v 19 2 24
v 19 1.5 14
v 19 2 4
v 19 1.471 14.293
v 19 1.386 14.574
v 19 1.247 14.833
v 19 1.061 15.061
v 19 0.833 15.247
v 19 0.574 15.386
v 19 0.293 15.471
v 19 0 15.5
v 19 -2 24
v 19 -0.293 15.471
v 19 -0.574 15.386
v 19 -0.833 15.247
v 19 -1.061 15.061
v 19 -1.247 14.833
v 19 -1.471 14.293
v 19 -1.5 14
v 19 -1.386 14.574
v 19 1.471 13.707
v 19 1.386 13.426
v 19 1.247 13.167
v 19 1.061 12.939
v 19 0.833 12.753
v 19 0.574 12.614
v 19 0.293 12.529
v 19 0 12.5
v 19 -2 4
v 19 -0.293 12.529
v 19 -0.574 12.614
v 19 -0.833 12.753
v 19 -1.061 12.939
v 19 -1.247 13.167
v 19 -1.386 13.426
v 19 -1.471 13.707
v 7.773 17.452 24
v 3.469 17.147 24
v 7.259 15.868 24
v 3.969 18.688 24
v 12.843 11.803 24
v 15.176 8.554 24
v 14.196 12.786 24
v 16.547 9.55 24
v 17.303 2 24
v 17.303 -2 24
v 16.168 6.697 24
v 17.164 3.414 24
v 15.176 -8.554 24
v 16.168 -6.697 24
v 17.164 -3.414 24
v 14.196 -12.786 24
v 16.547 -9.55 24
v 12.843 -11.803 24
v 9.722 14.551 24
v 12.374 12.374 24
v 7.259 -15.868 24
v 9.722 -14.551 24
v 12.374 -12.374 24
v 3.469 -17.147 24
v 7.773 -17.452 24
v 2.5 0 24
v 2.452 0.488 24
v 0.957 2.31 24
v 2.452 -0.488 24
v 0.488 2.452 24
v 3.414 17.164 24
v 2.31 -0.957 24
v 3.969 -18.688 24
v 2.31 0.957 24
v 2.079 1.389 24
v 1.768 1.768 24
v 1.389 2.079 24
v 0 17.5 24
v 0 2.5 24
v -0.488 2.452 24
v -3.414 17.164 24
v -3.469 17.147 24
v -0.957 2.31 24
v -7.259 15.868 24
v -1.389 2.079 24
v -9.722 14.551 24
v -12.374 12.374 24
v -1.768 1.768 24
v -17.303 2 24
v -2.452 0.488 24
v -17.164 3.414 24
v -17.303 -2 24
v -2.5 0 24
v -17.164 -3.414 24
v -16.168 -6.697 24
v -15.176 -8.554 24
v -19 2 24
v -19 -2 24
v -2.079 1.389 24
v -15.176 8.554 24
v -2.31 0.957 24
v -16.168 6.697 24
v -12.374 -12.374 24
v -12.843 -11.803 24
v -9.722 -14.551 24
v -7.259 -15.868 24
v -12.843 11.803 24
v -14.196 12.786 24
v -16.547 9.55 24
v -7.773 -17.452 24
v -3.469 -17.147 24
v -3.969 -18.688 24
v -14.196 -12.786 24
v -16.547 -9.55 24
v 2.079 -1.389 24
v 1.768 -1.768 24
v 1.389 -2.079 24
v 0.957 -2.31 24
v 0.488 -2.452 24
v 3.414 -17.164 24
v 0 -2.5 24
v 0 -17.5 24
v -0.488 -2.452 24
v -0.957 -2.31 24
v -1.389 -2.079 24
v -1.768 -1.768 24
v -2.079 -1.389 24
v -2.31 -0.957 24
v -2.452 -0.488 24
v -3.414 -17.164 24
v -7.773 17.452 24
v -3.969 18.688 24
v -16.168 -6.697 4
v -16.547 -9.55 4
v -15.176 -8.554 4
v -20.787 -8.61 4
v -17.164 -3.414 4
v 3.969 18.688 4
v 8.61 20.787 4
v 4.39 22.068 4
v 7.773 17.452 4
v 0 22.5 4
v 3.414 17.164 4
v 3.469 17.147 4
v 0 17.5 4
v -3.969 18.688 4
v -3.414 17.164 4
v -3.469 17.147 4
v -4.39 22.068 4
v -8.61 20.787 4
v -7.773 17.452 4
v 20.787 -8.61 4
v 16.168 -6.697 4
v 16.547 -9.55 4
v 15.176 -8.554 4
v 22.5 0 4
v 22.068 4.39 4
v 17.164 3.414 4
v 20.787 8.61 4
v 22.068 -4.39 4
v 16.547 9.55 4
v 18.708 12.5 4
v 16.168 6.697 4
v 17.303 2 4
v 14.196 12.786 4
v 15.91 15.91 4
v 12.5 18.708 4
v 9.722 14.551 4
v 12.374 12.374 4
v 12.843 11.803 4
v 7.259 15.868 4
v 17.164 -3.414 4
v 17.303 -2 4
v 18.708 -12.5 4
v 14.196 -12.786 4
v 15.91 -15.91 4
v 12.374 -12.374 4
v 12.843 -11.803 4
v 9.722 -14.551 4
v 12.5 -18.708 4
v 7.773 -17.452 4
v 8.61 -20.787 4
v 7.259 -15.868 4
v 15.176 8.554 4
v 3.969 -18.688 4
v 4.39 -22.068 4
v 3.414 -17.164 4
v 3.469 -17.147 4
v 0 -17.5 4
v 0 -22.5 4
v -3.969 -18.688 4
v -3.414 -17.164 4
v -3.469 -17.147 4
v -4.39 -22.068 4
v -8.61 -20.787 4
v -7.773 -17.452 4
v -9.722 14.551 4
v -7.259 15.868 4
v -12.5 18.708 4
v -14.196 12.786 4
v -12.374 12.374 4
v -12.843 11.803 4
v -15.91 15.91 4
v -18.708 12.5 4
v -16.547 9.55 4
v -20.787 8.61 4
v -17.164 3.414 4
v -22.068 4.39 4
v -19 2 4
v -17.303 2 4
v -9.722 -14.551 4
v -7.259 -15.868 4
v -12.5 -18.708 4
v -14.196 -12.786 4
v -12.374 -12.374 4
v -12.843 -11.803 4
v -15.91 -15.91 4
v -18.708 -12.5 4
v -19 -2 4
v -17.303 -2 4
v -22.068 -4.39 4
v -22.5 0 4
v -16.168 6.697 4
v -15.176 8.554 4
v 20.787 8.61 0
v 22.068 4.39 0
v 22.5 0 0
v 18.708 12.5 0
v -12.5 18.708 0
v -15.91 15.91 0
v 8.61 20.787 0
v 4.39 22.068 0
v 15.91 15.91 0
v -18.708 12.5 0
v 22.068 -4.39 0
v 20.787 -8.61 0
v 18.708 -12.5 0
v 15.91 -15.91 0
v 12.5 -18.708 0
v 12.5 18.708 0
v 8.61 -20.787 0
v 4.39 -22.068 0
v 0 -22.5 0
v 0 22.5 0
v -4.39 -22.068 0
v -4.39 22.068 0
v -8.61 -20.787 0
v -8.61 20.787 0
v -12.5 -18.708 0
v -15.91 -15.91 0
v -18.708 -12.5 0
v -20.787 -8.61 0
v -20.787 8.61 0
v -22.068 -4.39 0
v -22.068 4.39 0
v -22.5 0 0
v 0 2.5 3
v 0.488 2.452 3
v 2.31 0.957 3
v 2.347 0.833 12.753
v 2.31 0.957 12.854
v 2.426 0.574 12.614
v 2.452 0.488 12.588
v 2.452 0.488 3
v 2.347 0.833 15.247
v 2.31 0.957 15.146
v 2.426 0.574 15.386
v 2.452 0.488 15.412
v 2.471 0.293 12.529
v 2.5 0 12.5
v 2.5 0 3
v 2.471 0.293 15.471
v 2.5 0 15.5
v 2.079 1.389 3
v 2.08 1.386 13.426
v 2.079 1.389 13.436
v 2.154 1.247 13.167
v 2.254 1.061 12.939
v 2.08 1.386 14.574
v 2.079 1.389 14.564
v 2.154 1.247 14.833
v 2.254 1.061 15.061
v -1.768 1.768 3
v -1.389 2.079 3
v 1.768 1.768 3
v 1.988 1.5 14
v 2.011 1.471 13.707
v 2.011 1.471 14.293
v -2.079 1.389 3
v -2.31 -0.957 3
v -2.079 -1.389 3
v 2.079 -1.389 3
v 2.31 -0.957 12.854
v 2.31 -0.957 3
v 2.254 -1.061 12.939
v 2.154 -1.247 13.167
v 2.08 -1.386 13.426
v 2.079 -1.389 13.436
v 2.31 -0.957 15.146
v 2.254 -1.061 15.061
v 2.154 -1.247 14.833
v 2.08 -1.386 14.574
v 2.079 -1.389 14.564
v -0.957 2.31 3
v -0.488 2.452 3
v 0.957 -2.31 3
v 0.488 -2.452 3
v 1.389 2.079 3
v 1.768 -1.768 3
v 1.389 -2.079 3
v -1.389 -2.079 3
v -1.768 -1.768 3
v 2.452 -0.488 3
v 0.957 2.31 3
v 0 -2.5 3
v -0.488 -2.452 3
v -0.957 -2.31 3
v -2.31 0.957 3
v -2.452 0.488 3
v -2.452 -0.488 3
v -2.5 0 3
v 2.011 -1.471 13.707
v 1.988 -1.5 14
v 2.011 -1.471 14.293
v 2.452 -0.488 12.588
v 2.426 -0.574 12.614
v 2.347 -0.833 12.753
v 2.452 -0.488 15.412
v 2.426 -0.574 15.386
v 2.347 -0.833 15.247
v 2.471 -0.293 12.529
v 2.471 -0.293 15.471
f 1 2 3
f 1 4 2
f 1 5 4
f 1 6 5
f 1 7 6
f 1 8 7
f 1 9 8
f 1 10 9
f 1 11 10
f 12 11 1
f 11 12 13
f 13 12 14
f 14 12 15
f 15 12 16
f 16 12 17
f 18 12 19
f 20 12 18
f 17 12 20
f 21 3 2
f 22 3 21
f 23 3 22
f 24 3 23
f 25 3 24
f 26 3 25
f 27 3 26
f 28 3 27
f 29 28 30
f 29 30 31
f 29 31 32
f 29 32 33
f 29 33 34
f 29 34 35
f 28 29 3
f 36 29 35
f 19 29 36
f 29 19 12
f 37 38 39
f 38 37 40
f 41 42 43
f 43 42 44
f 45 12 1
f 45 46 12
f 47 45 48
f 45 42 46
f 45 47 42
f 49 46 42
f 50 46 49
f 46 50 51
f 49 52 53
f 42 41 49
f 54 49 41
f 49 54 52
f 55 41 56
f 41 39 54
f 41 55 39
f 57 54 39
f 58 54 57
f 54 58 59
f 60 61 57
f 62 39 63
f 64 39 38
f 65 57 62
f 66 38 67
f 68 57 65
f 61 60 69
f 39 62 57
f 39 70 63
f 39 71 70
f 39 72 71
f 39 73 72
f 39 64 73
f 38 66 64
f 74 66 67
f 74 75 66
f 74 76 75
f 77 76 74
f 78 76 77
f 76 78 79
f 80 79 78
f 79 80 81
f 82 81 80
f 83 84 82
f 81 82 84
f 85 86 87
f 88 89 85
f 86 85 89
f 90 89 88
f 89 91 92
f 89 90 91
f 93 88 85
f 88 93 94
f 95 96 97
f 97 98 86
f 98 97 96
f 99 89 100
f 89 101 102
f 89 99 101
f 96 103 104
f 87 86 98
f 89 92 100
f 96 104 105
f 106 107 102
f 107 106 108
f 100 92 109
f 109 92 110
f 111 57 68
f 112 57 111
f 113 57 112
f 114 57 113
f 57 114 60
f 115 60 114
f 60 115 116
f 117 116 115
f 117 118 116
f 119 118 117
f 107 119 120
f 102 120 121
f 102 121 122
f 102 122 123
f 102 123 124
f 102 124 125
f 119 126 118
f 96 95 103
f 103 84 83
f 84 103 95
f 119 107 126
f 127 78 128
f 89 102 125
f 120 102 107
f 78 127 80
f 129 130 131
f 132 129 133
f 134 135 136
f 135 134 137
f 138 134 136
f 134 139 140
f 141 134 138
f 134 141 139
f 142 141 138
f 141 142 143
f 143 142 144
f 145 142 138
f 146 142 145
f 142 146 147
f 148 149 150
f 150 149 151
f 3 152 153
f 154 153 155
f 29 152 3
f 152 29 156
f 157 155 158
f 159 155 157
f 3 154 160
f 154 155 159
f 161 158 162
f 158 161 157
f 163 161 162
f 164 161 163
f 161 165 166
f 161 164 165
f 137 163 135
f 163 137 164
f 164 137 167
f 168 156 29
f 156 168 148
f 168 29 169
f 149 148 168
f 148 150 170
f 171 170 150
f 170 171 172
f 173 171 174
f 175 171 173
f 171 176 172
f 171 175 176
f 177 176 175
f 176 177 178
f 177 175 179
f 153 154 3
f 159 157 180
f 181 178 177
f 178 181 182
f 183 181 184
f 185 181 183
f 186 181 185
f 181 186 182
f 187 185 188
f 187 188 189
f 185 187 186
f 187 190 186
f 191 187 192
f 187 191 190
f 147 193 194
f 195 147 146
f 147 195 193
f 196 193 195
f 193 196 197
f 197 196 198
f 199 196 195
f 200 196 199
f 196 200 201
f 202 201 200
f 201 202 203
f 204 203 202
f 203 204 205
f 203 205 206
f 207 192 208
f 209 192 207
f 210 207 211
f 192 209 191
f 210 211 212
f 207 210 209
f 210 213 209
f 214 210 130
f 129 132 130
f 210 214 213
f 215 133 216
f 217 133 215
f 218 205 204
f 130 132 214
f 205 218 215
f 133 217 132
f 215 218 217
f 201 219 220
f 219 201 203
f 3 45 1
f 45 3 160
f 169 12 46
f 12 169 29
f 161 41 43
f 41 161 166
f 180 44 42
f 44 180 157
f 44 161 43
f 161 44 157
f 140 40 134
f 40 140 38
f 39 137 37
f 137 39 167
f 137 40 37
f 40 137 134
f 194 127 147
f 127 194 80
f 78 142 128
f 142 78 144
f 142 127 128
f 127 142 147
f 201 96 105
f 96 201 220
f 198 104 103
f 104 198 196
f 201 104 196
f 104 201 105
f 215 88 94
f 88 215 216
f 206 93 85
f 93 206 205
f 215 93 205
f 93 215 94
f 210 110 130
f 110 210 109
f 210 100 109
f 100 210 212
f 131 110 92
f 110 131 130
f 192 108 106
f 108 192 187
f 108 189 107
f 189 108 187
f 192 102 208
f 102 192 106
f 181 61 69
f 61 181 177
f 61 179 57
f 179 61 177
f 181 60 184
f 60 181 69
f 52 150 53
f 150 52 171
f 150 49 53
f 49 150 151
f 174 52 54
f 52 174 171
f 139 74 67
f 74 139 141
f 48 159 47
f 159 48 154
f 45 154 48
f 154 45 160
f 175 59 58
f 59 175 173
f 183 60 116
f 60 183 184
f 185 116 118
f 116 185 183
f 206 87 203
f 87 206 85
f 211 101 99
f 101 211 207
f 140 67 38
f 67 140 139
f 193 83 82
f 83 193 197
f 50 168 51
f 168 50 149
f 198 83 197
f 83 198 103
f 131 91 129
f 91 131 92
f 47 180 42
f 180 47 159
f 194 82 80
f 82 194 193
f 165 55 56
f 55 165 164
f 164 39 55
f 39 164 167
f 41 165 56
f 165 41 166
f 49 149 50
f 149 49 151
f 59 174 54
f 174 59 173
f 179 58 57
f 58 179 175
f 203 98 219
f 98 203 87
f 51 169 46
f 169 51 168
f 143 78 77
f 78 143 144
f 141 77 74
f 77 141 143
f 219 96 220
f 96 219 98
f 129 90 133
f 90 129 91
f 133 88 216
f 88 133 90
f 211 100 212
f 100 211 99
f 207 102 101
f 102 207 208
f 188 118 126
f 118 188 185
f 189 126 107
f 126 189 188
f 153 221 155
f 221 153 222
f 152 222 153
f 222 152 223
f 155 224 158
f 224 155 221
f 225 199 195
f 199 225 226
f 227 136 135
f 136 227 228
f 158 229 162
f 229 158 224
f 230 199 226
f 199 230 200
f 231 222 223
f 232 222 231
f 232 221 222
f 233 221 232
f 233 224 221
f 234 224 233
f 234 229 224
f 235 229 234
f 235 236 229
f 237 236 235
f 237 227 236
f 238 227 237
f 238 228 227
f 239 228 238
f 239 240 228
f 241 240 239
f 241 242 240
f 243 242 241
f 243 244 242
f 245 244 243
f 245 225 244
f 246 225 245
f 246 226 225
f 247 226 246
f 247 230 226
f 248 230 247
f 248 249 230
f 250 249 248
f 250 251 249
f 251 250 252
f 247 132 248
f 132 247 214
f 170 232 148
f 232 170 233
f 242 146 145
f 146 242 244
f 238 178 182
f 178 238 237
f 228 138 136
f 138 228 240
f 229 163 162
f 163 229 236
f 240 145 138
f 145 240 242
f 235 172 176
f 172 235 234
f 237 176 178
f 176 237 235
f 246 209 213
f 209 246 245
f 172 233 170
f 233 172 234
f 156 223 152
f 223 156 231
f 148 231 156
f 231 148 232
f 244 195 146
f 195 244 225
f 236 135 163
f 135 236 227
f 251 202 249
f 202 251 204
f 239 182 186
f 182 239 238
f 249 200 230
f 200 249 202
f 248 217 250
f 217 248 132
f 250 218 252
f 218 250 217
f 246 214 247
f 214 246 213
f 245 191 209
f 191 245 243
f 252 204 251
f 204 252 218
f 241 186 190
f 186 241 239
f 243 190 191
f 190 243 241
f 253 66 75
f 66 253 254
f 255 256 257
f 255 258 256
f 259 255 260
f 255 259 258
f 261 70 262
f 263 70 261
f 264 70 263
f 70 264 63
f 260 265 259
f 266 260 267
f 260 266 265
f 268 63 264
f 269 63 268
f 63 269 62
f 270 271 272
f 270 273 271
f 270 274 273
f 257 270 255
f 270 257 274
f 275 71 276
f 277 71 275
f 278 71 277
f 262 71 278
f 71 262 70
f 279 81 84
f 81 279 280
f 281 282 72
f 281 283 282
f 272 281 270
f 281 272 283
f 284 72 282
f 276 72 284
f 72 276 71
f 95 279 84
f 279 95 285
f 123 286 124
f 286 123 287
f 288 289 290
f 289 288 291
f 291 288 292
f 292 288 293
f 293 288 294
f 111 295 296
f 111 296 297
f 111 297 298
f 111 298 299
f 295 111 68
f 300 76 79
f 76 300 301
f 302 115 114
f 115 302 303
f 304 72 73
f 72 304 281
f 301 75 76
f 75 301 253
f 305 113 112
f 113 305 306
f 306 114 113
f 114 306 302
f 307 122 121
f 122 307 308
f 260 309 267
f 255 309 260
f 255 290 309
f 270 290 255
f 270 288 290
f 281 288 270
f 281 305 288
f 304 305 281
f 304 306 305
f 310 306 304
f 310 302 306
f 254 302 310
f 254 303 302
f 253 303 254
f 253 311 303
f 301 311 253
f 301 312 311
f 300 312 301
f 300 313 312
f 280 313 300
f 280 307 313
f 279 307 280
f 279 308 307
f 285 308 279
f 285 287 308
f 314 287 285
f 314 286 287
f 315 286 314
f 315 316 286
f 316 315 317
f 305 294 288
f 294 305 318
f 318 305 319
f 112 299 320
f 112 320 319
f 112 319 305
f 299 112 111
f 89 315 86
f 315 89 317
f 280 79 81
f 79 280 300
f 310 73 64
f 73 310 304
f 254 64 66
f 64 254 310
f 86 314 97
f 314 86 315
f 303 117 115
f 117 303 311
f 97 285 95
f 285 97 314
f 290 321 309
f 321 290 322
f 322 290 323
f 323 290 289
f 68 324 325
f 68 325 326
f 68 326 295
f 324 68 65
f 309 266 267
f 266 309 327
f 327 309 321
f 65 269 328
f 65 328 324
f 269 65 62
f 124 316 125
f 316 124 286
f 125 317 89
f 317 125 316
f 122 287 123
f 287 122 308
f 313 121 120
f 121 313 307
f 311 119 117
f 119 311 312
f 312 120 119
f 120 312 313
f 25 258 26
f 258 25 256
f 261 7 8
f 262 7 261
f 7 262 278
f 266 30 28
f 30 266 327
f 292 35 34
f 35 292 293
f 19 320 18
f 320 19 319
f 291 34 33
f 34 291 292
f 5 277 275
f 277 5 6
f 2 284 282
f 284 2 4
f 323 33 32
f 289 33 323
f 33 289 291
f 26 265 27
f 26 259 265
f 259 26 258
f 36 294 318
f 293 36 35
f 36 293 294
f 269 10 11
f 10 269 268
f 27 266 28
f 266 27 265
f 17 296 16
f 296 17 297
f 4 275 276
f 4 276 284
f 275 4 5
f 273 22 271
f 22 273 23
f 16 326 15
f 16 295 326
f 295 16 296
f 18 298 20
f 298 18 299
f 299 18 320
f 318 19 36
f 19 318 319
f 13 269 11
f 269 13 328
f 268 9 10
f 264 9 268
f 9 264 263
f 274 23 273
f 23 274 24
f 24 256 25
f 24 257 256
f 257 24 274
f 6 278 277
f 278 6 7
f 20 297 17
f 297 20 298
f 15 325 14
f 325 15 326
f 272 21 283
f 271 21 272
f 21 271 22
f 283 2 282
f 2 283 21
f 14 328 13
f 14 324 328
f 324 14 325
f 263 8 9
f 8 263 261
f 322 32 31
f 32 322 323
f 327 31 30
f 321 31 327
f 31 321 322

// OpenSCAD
$fn = 32;

// ----------------------------------------------------------------------
// Control knob: skirt knob with grip ribs
// ----------------------------------------------------------------------

// --- parameters (mm) ---
skirt_d = 45;             // skirt diameter
skirt_t = 4;              // skirt thickness
rib_w = 4;                // grip rib width
rib_out = 2.5;            // grip rib radial protrusion
n_ribs = 10;              // number of grip ribs
knob_d = 35;              // knob body diameter
knob_h = 20;              // knob body height
bore_d = 5;               // shaft bore diameter
set_d = 3;                // set screw bore diameter

rib_step = 360 / n_ribs;  // rib angular step
total_h = skirt_t + knob_h;  // overall height

difference() {
  union() {
    translate([0, 0, skirt_t]) cylinder(h = knob_h, d = knob_d);
    cylinder(h = skirt_t, d = skirt_d);
    for (i = [0 : n_ribs - 1])
      rotate([0, 0, i * rib_step])
        translate([knob_d / 2 - 1, -rib_w / 2, skirt_t])
          cube([rib_out, rib_w, knob_h]);
  }
  translate([0, 0, skirt_t - 1]) cylinder(h = knob_h + 2, d = bore_d);
  translate([-1, 0, skirt_t + knob_h / 2]) rotate([0, 90, 0])
    cylinder(h = knob_d / 2 + bore_d / 2 + 2, d = set_d);
}
